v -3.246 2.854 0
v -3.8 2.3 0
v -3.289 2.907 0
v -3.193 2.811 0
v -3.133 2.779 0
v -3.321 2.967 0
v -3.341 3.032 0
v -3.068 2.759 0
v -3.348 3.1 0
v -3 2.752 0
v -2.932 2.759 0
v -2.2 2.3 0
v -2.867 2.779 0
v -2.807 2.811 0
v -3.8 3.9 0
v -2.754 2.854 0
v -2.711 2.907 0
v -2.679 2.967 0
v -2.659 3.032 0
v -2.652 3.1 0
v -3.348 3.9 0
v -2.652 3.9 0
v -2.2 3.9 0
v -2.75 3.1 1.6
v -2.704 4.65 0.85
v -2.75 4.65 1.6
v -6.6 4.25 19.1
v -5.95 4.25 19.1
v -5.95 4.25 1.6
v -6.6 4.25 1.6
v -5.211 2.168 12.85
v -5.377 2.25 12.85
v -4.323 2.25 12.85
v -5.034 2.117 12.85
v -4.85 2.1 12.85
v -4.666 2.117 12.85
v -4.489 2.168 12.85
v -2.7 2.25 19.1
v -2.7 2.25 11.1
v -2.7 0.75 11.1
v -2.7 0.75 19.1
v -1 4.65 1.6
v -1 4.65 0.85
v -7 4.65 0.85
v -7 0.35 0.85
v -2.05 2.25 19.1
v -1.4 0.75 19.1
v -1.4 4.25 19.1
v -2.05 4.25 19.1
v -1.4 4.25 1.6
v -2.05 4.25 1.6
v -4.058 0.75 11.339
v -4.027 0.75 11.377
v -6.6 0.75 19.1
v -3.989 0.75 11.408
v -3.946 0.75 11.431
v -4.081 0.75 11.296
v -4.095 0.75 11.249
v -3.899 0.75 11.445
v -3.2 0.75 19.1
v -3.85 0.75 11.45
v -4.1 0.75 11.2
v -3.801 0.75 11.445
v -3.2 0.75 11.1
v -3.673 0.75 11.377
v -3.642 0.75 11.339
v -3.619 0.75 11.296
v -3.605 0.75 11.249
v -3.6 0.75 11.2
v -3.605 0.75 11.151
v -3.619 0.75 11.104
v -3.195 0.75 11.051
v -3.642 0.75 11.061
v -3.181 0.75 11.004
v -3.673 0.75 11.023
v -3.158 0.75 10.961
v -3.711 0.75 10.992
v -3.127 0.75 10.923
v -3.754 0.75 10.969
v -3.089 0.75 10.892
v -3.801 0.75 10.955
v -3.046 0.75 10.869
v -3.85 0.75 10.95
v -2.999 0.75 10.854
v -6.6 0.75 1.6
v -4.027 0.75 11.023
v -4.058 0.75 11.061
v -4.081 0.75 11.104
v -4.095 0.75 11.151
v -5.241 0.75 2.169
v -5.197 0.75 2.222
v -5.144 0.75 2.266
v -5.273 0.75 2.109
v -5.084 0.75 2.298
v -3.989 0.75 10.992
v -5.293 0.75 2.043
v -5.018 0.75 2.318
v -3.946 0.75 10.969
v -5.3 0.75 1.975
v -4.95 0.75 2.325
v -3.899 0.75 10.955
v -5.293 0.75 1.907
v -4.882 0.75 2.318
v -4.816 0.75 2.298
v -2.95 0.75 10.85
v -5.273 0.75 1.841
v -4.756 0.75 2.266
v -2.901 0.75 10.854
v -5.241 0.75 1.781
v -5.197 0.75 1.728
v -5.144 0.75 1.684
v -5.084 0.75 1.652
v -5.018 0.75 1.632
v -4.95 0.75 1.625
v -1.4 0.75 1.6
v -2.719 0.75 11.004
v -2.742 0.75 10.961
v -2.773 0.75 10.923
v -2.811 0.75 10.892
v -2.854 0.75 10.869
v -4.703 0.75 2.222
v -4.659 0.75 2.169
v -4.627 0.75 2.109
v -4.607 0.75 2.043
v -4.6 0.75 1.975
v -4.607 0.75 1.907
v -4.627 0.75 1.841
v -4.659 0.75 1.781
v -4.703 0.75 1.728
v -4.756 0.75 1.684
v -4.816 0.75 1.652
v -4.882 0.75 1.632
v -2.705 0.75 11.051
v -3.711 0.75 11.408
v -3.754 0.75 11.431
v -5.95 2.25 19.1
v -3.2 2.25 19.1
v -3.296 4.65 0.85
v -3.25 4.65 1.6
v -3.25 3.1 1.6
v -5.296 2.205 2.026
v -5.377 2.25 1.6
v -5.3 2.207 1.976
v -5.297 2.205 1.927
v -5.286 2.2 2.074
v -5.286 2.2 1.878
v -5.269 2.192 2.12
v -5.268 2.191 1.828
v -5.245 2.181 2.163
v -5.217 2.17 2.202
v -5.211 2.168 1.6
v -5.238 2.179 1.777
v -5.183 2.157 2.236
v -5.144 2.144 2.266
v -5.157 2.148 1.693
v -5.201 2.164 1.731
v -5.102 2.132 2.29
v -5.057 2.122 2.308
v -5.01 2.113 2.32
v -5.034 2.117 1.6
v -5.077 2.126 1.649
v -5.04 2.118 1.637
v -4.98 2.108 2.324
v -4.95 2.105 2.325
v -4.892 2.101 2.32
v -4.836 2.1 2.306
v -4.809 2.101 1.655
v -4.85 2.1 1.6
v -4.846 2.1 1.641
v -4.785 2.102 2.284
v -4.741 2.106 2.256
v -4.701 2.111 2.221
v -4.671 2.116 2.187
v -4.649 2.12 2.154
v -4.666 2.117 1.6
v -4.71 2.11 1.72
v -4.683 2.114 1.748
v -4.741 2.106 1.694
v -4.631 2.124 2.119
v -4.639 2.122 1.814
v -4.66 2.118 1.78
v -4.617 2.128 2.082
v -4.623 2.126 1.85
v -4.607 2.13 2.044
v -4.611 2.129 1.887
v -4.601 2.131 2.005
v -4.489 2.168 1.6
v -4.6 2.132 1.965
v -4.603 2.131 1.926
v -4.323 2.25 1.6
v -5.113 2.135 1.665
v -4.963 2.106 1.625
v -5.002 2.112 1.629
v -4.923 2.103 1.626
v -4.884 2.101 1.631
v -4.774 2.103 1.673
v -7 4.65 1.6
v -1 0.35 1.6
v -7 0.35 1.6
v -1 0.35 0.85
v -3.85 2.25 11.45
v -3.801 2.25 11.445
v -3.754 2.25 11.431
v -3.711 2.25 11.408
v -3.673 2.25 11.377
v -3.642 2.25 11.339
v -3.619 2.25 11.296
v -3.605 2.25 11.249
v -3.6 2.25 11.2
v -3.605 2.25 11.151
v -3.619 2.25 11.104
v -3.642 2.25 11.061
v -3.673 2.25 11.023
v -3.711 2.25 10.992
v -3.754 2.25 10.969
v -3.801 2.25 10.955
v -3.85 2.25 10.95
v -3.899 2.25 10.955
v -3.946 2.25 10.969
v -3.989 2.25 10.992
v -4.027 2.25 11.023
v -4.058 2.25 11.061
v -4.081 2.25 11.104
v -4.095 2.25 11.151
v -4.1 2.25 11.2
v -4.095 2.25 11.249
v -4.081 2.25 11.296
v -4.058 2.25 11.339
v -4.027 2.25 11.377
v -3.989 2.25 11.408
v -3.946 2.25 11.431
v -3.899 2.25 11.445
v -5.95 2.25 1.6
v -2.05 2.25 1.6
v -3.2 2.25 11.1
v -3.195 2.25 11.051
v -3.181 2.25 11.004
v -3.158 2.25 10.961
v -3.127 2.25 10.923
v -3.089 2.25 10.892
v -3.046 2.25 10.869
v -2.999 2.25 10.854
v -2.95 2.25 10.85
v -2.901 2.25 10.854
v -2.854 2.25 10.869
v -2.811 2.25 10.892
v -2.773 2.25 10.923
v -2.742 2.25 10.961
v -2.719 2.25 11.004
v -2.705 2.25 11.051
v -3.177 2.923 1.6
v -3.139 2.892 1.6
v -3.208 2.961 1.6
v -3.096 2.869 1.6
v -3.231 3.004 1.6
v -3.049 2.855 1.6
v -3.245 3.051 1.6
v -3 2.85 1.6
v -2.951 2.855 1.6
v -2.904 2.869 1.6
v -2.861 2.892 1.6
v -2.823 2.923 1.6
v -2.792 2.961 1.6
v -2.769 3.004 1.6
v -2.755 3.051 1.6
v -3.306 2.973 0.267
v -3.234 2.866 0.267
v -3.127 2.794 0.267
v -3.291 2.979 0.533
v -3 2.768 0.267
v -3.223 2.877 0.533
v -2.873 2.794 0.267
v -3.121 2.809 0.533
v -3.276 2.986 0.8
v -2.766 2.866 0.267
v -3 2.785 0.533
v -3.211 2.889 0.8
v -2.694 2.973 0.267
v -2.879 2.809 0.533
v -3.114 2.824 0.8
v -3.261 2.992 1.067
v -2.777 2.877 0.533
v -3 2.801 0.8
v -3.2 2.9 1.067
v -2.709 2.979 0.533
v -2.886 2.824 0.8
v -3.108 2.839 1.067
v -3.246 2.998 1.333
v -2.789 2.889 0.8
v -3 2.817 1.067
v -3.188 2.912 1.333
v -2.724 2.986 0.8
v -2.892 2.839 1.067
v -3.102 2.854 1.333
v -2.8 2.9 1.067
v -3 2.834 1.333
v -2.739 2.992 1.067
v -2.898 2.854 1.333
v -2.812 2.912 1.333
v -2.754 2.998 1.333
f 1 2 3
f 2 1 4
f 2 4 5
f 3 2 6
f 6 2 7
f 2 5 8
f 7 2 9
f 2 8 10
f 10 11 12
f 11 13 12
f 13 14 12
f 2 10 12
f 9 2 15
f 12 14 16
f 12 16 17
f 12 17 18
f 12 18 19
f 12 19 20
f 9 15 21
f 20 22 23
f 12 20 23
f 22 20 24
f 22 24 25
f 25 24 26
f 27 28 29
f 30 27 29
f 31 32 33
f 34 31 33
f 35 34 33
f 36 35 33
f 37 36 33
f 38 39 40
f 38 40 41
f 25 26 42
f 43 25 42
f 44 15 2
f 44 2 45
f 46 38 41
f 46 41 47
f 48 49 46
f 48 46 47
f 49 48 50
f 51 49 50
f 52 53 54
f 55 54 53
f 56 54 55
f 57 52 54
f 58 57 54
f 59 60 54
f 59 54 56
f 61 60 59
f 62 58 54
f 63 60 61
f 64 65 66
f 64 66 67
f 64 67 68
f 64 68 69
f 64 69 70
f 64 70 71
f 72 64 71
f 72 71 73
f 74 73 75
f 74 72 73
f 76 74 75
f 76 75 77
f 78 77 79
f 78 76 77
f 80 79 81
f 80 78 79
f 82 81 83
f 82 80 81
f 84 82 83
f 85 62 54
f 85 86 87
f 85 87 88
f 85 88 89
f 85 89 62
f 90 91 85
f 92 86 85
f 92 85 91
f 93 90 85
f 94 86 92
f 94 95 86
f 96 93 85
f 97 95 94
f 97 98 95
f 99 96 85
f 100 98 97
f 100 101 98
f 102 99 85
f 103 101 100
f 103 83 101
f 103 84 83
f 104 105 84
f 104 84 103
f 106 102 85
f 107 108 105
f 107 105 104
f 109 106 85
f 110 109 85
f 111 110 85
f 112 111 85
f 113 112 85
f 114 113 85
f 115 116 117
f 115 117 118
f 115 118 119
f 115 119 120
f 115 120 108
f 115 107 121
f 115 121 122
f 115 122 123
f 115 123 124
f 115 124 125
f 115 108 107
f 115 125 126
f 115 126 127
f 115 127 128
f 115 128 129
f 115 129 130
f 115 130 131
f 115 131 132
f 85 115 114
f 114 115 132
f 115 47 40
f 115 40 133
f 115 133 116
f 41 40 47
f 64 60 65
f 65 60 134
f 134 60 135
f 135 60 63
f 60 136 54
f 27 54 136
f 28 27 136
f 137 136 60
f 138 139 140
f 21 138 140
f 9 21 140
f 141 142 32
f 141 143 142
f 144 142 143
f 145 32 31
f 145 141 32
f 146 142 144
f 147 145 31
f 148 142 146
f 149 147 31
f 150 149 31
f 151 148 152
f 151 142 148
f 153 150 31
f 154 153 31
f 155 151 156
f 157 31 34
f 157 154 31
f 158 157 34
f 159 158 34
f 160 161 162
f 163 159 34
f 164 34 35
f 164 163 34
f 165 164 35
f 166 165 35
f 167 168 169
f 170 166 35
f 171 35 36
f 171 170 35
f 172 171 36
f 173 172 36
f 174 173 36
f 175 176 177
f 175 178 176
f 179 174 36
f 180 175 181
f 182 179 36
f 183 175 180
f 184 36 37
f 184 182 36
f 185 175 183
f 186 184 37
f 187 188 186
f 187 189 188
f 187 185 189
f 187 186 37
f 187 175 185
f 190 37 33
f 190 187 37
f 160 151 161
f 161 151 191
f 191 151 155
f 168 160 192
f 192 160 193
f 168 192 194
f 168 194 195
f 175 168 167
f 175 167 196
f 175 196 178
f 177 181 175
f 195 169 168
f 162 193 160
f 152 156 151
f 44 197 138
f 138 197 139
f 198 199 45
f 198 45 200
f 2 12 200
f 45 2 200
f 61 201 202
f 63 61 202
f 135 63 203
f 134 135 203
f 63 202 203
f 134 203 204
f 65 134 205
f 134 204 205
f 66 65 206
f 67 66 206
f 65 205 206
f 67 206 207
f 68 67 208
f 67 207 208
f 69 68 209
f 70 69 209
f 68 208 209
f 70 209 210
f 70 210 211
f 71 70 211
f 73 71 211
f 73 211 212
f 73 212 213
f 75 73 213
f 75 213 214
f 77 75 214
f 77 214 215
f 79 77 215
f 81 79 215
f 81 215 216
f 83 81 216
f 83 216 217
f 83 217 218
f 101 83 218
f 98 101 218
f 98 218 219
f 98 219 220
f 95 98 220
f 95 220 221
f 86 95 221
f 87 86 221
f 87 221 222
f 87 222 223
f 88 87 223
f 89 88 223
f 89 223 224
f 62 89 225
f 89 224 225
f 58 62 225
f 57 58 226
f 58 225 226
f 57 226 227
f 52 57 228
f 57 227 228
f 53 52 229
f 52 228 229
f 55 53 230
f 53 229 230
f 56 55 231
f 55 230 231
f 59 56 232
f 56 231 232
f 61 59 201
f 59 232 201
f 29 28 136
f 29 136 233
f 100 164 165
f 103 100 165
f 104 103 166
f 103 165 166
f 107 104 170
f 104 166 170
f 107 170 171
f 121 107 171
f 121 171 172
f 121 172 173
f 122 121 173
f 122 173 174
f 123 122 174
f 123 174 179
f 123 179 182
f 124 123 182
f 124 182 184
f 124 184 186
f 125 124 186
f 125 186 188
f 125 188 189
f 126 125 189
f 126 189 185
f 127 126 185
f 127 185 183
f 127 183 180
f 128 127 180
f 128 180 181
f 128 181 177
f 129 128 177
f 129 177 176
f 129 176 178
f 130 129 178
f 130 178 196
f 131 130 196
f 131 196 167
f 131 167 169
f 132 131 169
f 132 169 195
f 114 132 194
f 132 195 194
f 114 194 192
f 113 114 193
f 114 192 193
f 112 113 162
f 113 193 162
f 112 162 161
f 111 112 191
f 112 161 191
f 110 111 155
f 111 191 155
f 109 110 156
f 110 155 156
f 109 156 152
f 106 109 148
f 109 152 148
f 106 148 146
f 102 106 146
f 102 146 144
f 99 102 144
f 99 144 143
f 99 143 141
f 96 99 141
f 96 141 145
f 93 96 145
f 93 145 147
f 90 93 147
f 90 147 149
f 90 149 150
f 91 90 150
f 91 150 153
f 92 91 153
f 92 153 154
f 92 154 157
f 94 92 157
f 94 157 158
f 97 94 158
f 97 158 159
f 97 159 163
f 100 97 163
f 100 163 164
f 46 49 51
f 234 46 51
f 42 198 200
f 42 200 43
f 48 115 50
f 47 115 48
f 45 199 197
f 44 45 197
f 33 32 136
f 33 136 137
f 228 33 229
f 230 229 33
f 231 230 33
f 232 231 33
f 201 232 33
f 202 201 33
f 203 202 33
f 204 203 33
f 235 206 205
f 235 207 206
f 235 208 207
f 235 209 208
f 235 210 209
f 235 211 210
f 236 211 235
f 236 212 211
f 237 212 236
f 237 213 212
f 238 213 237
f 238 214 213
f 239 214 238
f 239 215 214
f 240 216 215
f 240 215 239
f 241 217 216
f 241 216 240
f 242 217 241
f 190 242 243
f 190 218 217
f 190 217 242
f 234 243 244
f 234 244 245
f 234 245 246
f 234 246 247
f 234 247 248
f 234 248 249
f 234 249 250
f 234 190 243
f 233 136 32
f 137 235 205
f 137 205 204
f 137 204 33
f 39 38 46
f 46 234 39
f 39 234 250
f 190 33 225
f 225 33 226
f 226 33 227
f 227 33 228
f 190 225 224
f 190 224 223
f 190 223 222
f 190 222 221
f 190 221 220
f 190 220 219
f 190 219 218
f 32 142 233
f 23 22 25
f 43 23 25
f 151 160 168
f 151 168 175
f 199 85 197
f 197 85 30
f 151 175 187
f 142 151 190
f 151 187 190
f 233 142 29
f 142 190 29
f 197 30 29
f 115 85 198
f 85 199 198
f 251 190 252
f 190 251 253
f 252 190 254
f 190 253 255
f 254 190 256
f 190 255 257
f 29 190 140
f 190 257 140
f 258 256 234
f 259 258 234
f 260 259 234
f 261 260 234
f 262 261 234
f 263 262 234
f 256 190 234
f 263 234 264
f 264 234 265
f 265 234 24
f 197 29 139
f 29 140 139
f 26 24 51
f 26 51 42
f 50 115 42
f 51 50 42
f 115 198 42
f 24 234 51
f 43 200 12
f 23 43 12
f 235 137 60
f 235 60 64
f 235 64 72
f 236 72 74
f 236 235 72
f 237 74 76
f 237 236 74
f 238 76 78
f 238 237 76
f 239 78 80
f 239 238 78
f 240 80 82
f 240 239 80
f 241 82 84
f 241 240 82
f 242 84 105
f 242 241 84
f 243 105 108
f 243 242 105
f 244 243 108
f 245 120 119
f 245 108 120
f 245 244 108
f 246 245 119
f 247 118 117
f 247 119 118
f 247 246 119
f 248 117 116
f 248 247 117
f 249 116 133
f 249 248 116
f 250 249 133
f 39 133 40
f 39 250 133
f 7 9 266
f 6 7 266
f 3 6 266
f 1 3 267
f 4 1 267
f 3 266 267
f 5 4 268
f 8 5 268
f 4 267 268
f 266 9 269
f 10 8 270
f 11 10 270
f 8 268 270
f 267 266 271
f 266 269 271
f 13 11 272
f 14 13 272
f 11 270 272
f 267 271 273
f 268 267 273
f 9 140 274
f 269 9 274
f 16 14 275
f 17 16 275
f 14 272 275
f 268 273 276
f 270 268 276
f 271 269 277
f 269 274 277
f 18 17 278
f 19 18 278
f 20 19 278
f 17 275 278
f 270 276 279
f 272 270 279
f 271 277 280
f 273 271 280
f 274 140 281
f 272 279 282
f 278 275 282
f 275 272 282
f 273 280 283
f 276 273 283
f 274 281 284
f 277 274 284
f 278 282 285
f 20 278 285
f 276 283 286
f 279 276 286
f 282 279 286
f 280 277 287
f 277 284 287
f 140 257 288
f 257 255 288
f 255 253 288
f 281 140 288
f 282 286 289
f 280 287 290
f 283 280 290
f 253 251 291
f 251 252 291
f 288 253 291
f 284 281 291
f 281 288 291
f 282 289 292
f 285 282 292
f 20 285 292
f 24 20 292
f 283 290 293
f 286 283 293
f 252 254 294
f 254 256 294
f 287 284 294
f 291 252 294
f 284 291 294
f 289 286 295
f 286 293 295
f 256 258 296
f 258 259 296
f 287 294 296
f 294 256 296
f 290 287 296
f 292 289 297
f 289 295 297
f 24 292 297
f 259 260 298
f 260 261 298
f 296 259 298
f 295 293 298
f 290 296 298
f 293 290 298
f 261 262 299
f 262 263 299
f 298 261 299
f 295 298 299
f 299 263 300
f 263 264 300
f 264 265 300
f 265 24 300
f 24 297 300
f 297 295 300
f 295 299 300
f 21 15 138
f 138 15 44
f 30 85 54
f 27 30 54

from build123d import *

# Parameters (mm, degrees)
SKETCH4_W           = 8
SKETCH4_H           = 5
EXTRUDE1_DEPTH      = 19.1
SKETCH6_W           = 17.706910835
SKETCH6_H           = 1.662230216
CUT_EXTRUDE1_DEPTH  = 18.6
SKETCH7_W           = 17.592020929
SKETCH7_H           = 1.332722913
CUT_EXTRUDE2_DEPTH  = 18.6
SKETCH8_W           = 5.300719424
SKETCH8_H           = 17.765707434
SKETCH8_W_2         = 2.943884892
SKETCH8_H_2         = 17.795443645
CUT_EXTRUDE3_DEPTH  = 18.6
SKETCH10_W          = 3.9
SKETCH10_H          = 17.990453763
CUT_EXTRUDE4_DEPTH  = 2
SKETCH11_R          = 0.25
CUT_EXTRUDE5_DEPTH  = 2
CUT_EXTRUDE6_DEPTH  = 2
SKETCH14_R          = 0.35
CUT_EXTRUDE8_DEPTH  = 2
CUT_EXTRUDE16_DEPTH = 2.6
CUT_EXTRUDE16_DRAFT = 3.5
SKETCH29_W          = 8
SKETCH29_H          = 5
SKETCH29_W_2        = 6
SKETCH29_H_2        = 4.3
CUT_EXTRUDE19_DEPTH = 2.5
CUT_EXTRUDE20_DEPTH = 5.3
CUT_EXTRUDE21_DEPTH = 7
SKETCH19_R          = 1
CUT_EXTRUDE11_DEPTH = 11.25


with BuildPart() as part:
    # Sketch4 → Extrude1 (new body)
    with BuildSketch(Plane.XY):
        with Locations((-4, 2.5)):
            Rectangle(SKETCH4_W, SKETCH4_H)
    extrude(amount=EXTRUDE1_DEPTH)

    # Sketch6 → Cut-Extrude1 (cut)
    with BuildSketch(Plane(origin=(0, 0, 0), x_dir=(0, 0, -1), z_dir=(1, 0, 0))):
        with Locations((-10.453455418, -0.081115108)):
            Rectangle(SKETCH6_W, SKETCH6_H)
    extrude(amount=-CUT_EXTRUDE1_DEPTH, mode=Mode.SUBTRACT)

    # Sketch7 → Cut-Extrude2 (cut)
    with BuildSketch(Plane(origin=(0, 0, 0), x_dir=(0, 0, -1), z_dir=(1, 0, 0))):
        with Locations((-10.396010465, 4.916361457)):
            Rectangle(SKETCH7_W, SKETCH7_H)
    extrude(amount=-CUT_EXTRUDE2_DEPTH, mode=Mode.SUBTRACT)

    # Sketch8 → Cut-Extrude3 (cut)
    with BuildSketch(Plane.XZ.offset(-0.75)):
        with Locations((-9.250359712, 10.482853717)):
            Rectangle(SKETCH8_W, SKETCH8_H)
        with Locations((0.071942446, 10.497721823)):
            Rectangle(SKETCH8_W_2, SKETCH8_H_2)
    extrude(amount=-CUT_EXTRUDE3_DEPTH, mode=Mode.SUBTRACT)

    # Sketch10 → Cut-Extrude4 (cut)
    with BuildSketch(Plane(origin=(0, 4.25, 0), x_dir=(1, 0, 0), z_dir=(0, 1, 0))):
        with Locations((-4, -10.595226882)):
            Rectangle(SKETCH10_W, SKETCH10_H)
    extrude(amount=-CUT_EXTRUDE4_DEPTH, mode=Mode.SUBTRACT)

    # Sketch11 → Cut-Extrude5 (cut)
    with BuildSketch(Plane(origin=(0, 2.25, 0), x_dir=(1, 0, 0), z_dir=(0, 1, 0))):
        with Locations(Location((-3.85, -11.2, 0), (0, 0, 270))):  # turned: the seam where the file's is
            Circle(SKETCH11_R)
    extrude(amount=-CUT_EXTRUDE5_DEPTH, mode=Mode.SUBTRACT)

    # Sketch12 → Cut-Extrude6 (cut)
    with BuildSketch(Plane(origin=(0, 2.25, 0), x_dir=(1, 0, 0), z_dir=(0, 1, 0))):
        with BuildLine():
            Line((-3.2, -19.099584714), (-3.2, -11.099584714))
            ThreePointArc((-3.2, -11.099584714), (-2.95, -10.849584714), (-2.7, -11.099584714))
            Line((-2.7, -11.099584714), (-2.7, -19.099584714))
            ThreePointArc((-2.7, -19.099584714), (-2.95, -19.349584714), (-3.2, -19.099584714))
        make_face()
    extrude(amount=-CUT_EXTRUDE6_DEPTH, mode=Mode.SUBTRACT)

    # Sketch14 → Cut-Extrude8 (cut)
    with BuildSketch(Plane(origin=(0, 2.25, 0), x_dir=(1, 0, 0), z_dir=(0, 1, 0))):
        with Locations(Location((-4.95, -1.975, 0), (0, 0, 270))):  # turned: the seam where the file's is
            Circle(SKETCH14_R)
    extrude(amount=-CUT_EXTRUDE8_DEPTH, mode=Mode.SUBTRACT)


with BuildPart() as cut_extrude16_tool:
    # Sketch28 → Cut-Extrude16 (with draft: the straight prism first)
    with BuildSketch(Plane.XY.offset(1.6)):
        with BuildLine():
            ThreePointArc((-3.25, 3.1), (-3, 2.85), (-2.75, 3.1))
            Line((-2.75, 3.1), (-2.75, 5))
            Line((-2.75, 5), (-3.25, 5))
            Line((-3.25, 5), (-3.25, 3.1))
        make_face()
    extrude(amount=-CUT_EXTRUDE16_DEPTH)
    # Cut-Extrude16: the draft: its side faces are tilted about the plane it starts from
    cut_extrude16_sides = [cut_extrude16_tool.faces().sort_by_distance(p)[0] for p in [
        (-3, 2.85, 0.3),
        (-2.75, 4.05, 0.3),
        (-3, 5, 0.3),
        (-3.25, 4.05, 0.3),
    ]]
    draft(cut_extrude16_sides, Plane.XY.offset(1.6), CUT_EXTRUDE16_DRAFT)


with BuildPart() as part_1:
    add(part.part)

    # Cut-Extrude16: cut by cut_extrude16_tool
    add(cut_extrude16_tool.part, mode=Mode.SUBTRACT)

    # Sketch29 → Cut-Extrude19 (cut)
    with BuildSketch(Plane.XY.offset(1.6)):
        with Locations((-4, 2.5)):
            Rectangle(SKETCH29_W, SKETCH29_H)
        with Locations((-4, 2.5)):
            Rectangle(SKETCH29_W_2, SKETCH29_H_2, mode=Mode.SUBTRACT)
    extrude(amount=-CUT_EXTRUDE19_DEPTH, mode=Mode.SUBTRACT)

    # Sketch18 → Cut-Extrude20 (cut, through all)
    with BuildSketch(Plane(origin=(0, 4.65, 0), x_dir=(1, 0, 0), z_dir=(0, 1, 0))):
        Polygon((-3.8, 0), (-7, -0.85), (-7, 0), align=None)
        Polygon((-2.2, 0), (-1, 0), (-1, -0.85), align=None)
    extrude(amount=-CUT_EXTRUDE20_DEPTH, mode=Mode.SUBTRACT)

    # Sketch30 → Cut-Extrude21 (cut, through all)
    with BuildSketch(Plane.ZY.offset(7)):
        Polygon((0, 3.9), (0.85, 4.65), (0, 4.65), align=None)
        Polygon((0, 2.3), (0.85, 0.35), (0, 0.35), align=None)
    extrude(amount=-CUT_EXTRUDE21_DEPTH, mode=Mode.SUBTRACT)

    # Sketch19 → Cut-Extrude11 (cut)
    with BuildSketch(Plane.XY.offset(1.6)):
        with Locations((-4.85, 3.1)):
            Circle(SKETCH19_R)
    extrude(amount=CUT_EXTRUDE11_DEPTH, mode=Mode.SUBTRACT)


solid = part_1.part
